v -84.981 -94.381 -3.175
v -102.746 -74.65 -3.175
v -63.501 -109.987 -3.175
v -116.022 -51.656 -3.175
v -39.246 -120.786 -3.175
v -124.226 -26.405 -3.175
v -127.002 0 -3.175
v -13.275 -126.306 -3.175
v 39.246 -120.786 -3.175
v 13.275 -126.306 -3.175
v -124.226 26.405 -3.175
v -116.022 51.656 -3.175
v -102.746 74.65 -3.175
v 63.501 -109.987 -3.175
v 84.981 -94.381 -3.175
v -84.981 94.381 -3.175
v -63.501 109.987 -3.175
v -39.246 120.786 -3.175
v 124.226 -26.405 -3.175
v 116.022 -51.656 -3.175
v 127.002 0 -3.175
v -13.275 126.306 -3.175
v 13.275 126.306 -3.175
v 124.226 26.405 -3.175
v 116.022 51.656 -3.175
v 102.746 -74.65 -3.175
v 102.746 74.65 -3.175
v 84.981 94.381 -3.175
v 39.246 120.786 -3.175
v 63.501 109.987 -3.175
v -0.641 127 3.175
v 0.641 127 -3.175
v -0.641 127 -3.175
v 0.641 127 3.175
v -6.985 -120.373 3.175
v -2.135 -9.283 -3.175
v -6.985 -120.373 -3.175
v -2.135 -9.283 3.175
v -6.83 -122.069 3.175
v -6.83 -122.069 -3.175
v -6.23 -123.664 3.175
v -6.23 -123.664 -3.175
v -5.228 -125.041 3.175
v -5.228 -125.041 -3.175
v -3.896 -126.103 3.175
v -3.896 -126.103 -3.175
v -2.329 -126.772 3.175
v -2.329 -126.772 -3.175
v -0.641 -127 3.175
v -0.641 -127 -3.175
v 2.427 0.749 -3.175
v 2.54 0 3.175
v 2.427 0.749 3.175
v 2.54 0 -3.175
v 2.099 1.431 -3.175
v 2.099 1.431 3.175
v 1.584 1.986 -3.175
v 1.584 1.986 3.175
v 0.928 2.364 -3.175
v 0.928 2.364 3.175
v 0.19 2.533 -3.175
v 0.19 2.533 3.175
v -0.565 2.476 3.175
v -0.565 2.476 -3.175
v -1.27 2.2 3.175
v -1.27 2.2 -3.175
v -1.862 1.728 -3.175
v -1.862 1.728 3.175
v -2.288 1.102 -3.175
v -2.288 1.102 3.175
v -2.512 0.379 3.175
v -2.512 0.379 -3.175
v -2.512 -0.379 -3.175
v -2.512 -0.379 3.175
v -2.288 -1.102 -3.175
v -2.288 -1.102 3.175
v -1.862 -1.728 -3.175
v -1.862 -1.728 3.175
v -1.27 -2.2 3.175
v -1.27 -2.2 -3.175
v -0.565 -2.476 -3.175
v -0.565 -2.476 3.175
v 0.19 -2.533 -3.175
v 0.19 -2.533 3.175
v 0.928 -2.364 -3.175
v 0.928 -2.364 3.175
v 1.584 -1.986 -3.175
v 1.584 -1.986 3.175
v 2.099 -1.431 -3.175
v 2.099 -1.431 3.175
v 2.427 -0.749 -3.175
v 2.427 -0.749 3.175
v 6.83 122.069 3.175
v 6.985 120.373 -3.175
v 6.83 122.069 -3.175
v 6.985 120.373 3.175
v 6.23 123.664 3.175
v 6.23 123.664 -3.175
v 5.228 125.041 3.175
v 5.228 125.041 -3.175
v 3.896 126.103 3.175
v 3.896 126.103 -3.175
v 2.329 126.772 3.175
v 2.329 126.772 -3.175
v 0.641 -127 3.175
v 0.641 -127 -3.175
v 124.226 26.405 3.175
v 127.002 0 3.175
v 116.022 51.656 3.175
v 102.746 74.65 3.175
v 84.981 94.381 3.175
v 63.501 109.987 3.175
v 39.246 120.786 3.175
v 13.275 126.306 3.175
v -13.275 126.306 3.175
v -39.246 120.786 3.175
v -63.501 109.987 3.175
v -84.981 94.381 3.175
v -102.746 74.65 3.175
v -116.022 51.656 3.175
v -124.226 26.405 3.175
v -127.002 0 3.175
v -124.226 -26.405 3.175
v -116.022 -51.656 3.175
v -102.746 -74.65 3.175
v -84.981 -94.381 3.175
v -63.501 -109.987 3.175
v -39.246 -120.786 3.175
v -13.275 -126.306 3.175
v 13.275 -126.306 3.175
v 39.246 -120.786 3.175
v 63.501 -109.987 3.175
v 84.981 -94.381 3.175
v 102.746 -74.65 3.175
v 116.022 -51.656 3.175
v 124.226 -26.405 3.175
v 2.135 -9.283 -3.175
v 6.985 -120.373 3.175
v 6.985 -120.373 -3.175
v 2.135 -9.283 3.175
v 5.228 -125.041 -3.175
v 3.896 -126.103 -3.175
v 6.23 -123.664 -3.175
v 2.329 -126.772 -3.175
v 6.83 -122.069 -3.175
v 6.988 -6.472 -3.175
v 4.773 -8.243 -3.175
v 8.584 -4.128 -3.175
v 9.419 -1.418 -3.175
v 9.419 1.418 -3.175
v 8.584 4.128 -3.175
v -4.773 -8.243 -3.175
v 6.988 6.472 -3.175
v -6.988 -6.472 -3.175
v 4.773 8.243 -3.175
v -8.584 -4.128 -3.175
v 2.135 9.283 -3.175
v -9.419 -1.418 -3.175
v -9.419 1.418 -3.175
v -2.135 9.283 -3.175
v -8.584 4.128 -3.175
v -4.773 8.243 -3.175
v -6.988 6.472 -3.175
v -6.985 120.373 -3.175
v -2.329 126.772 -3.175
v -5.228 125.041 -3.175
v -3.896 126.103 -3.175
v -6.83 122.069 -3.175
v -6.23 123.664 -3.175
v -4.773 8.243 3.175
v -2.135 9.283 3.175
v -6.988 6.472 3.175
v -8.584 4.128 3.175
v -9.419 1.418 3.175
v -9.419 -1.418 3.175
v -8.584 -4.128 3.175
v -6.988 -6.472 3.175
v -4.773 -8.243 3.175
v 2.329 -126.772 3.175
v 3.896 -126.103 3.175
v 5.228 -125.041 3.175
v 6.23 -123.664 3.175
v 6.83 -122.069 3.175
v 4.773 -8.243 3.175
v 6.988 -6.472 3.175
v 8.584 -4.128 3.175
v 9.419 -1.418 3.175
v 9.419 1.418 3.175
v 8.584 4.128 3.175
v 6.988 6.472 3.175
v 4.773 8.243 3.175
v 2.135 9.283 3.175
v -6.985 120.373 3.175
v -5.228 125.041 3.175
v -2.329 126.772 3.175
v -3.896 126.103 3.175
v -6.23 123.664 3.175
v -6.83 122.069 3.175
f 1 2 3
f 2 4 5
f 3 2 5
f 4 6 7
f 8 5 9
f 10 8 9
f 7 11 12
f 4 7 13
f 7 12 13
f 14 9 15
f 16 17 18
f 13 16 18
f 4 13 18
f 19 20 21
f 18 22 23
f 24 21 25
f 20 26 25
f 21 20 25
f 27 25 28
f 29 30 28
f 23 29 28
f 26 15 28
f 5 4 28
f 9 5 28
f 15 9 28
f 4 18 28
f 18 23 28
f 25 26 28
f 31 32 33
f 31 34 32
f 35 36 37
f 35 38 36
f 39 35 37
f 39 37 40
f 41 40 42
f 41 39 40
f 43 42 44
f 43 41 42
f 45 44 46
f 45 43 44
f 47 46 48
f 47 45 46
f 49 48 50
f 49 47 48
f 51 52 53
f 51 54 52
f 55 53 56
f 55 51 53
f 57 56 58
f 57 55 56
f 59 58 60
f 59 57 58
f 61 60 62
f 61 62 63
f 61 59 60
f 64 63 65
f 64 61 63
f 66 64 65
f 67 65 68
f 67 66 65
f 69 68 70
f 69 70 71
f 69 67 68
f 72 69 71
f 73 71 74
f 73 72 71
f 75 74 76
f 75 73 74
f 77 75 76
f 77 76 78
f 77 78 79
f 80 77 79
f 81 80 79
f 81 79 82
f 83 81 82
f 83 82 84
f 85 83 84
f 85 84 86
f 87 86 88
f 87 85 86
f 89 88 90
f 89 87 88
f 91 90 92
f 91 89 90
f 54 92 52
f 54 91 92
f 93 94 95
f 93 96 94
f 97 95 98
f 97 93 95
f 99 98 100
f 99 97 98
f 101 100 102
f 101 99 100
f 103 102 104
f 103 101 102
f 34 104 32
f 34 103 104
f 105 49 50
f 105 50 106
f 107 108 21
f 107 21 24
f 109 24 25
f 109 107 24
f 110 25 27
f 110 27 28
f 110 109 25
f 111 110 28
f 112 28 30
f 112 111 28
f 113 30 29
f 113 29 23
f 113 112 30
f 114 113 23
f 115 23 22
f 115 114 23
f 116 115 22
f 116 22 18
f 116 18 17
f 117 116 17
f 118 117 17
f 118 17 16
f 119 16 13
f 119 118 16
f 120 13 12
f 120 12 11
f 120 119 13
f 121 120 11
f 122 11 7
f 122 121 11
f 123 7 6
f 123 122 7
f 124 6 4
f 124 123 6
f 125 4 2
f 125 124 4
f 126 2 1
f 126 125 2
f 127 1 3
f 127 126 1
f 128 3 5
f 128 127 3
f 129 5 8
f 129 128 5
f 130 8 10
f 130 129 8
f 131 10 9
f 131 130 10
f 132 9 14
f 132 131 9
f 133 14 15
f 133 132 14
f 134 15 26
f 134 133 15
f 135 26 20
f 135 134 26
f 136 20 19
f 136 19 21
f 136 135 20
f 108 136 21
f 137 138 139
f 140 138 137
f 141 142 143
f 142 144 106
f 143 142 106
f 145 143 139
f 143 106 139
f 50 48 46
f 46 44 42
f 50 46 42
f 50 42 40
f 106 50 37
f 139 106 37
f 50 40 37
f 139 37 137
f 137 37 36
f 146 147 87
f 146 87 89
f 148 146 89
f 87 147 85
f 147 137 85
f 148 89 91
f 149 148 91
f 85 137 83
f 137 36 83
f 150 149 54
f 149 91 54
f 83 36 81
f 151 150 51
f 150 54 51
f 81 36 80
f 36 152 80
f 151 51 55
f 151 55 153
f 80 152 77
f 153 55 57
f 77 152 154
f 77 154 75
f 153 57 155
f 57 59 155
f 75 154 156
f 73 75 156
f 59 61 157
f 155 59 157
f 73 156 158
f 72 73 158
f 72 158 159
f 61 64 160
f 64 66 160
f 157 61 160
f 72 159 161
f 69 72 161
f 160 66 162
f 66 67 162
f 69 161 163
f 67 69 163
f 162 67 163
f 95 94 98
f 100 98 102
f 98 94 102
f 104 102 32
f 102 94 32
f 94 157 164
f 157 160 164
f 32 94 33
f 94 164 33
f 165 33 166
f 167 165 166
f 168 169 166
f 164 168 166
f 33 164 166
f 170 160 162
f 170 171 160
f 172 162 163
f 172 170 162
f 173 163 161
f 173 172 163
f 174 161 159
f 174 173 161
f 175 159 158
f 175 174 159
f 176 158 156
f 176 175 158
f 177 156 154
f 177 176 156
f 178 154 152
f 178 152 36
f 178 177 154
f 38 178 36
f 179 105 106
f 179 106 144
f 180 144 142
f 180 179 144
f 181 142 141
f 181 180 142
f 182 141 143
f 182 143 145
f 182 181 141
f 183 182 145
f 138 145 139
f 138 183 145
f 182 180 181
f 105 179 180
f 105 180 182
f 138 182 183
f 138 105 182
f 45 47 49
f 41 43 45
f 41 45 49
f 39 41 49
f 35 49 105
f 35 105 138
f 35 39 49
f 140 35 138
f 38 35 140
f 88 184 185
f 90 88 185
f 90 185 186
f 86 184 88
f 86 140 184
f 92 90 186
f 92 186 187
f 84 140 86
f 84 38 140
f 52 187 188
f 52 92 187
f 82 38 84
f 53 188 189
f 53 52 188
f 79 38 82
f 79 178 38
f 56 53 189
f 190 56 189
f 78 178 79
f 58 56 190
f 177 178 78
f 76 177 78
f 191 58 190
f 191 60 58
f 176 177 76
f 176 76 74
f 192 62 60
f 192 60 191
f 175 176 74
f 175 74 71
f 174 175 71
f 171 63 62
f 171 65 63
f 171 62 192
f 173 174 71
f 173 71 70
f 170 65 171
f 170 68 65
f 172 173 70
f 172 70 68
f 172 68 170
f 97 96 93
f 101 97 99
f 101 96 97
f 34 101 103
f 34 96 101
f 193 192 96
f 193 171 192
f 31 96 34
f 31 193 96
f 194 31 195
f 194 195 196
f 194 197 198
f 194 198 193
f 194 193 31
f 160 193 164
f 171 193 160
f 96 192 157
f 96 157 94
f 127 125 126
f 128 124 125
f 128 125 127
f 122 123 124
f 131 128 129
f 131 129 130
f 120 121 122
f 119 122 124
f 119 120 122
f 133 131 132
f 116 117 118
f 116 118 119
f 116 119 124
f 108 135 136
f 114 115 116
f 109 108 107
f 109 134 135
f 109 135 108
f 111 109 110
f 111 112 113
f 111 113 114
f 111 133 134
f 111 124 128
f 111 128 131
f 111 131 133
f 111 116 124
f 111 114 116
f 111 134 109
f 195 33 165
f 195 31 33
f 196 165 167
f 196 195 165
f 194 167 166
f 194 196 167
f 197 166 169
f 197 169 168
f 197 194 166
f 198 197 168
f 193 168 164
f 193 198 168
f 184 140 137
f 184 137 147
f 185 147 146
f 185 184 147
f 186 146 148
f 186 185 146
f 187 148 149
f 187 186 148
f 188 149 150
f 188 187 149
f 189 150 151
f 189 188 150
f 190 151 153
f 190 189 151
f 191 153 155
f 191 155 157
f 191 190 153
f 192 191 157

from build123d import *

# Parameters (mm, degrees)
SKETCH1_R           = 2.54
BOSS_EXTRUDE1_DEPTH = 3.175
SKETCH2_R           = 127.001617852
BOSS_EXTRUDE2_DEPTH = 6.35


with BuildPart() as part:
    # Sketch1 → Boss-Extrude1 (new, symmetric)
    with BuildSketch(Plane(origin=(0, 0, 0), x_dir=(0, 1, 0), z_dir=(0, 0, 1))):
        with BuildLine():
            Line((-9.282710437, 2.134692472), (-120.37301689, 6.985))
            ThreePointArc((-120.37301689, 6.985), (-125.041107904, 5.228054952), (-127, 0.641043793))
            Line((-127, 0.641043793), (-127, -0.641043793))
            ThreePointArc((-127, -0.641043793), (-125.041107904, -5.228054952), (-120.37301689, -6.985))
            Line((-120.37301689, -6.985), (-9.282710437, -2.134692472))
            ThreePointArc((-9.282710437, -2.134692472), (0, -9.525), (9.282710437, -2.134692472))
            Line((9.282710437, -2.134692472), (120.37301689, -6.985))
            ThreePointArc((120.37301689, -6.985), (125.041107904, -5.228054952), (127, -0.641043793))
            Line((127, -0.641043793), (127, 0.641043793))
            ThreePointArc((127, 0.641043793), (125.041107904, 5.228054952), (120.37301689, 6.985))
            Line((120.37301689, 6.985), (9.282710437, 2.134692472))
            ThreePointArc((9.282710437, 2.134692472), (0, 9.525), (-9.282710437, 2.134692472))
        make_face()
        with Locations(Location((0, 0, 0), (0, 0, 270))):
            Circle(SKETCH1_R, mode=Mode.SUBTRACT)
    extrude(amount=BOSS_EXTRUDE1_DEPTH, both=True)


with BuildPart() as body_2:
    # Sketch2 → Boss-Extrude2 (new body)
    with BuildSketch(Plane.XY.offset(3.175)):
        Circle(SKETCH2_R)
    extrude(amount=-BOSS_EXTRUDE2_DEPTH)


solid = Compound([part.part, body_2.part])
